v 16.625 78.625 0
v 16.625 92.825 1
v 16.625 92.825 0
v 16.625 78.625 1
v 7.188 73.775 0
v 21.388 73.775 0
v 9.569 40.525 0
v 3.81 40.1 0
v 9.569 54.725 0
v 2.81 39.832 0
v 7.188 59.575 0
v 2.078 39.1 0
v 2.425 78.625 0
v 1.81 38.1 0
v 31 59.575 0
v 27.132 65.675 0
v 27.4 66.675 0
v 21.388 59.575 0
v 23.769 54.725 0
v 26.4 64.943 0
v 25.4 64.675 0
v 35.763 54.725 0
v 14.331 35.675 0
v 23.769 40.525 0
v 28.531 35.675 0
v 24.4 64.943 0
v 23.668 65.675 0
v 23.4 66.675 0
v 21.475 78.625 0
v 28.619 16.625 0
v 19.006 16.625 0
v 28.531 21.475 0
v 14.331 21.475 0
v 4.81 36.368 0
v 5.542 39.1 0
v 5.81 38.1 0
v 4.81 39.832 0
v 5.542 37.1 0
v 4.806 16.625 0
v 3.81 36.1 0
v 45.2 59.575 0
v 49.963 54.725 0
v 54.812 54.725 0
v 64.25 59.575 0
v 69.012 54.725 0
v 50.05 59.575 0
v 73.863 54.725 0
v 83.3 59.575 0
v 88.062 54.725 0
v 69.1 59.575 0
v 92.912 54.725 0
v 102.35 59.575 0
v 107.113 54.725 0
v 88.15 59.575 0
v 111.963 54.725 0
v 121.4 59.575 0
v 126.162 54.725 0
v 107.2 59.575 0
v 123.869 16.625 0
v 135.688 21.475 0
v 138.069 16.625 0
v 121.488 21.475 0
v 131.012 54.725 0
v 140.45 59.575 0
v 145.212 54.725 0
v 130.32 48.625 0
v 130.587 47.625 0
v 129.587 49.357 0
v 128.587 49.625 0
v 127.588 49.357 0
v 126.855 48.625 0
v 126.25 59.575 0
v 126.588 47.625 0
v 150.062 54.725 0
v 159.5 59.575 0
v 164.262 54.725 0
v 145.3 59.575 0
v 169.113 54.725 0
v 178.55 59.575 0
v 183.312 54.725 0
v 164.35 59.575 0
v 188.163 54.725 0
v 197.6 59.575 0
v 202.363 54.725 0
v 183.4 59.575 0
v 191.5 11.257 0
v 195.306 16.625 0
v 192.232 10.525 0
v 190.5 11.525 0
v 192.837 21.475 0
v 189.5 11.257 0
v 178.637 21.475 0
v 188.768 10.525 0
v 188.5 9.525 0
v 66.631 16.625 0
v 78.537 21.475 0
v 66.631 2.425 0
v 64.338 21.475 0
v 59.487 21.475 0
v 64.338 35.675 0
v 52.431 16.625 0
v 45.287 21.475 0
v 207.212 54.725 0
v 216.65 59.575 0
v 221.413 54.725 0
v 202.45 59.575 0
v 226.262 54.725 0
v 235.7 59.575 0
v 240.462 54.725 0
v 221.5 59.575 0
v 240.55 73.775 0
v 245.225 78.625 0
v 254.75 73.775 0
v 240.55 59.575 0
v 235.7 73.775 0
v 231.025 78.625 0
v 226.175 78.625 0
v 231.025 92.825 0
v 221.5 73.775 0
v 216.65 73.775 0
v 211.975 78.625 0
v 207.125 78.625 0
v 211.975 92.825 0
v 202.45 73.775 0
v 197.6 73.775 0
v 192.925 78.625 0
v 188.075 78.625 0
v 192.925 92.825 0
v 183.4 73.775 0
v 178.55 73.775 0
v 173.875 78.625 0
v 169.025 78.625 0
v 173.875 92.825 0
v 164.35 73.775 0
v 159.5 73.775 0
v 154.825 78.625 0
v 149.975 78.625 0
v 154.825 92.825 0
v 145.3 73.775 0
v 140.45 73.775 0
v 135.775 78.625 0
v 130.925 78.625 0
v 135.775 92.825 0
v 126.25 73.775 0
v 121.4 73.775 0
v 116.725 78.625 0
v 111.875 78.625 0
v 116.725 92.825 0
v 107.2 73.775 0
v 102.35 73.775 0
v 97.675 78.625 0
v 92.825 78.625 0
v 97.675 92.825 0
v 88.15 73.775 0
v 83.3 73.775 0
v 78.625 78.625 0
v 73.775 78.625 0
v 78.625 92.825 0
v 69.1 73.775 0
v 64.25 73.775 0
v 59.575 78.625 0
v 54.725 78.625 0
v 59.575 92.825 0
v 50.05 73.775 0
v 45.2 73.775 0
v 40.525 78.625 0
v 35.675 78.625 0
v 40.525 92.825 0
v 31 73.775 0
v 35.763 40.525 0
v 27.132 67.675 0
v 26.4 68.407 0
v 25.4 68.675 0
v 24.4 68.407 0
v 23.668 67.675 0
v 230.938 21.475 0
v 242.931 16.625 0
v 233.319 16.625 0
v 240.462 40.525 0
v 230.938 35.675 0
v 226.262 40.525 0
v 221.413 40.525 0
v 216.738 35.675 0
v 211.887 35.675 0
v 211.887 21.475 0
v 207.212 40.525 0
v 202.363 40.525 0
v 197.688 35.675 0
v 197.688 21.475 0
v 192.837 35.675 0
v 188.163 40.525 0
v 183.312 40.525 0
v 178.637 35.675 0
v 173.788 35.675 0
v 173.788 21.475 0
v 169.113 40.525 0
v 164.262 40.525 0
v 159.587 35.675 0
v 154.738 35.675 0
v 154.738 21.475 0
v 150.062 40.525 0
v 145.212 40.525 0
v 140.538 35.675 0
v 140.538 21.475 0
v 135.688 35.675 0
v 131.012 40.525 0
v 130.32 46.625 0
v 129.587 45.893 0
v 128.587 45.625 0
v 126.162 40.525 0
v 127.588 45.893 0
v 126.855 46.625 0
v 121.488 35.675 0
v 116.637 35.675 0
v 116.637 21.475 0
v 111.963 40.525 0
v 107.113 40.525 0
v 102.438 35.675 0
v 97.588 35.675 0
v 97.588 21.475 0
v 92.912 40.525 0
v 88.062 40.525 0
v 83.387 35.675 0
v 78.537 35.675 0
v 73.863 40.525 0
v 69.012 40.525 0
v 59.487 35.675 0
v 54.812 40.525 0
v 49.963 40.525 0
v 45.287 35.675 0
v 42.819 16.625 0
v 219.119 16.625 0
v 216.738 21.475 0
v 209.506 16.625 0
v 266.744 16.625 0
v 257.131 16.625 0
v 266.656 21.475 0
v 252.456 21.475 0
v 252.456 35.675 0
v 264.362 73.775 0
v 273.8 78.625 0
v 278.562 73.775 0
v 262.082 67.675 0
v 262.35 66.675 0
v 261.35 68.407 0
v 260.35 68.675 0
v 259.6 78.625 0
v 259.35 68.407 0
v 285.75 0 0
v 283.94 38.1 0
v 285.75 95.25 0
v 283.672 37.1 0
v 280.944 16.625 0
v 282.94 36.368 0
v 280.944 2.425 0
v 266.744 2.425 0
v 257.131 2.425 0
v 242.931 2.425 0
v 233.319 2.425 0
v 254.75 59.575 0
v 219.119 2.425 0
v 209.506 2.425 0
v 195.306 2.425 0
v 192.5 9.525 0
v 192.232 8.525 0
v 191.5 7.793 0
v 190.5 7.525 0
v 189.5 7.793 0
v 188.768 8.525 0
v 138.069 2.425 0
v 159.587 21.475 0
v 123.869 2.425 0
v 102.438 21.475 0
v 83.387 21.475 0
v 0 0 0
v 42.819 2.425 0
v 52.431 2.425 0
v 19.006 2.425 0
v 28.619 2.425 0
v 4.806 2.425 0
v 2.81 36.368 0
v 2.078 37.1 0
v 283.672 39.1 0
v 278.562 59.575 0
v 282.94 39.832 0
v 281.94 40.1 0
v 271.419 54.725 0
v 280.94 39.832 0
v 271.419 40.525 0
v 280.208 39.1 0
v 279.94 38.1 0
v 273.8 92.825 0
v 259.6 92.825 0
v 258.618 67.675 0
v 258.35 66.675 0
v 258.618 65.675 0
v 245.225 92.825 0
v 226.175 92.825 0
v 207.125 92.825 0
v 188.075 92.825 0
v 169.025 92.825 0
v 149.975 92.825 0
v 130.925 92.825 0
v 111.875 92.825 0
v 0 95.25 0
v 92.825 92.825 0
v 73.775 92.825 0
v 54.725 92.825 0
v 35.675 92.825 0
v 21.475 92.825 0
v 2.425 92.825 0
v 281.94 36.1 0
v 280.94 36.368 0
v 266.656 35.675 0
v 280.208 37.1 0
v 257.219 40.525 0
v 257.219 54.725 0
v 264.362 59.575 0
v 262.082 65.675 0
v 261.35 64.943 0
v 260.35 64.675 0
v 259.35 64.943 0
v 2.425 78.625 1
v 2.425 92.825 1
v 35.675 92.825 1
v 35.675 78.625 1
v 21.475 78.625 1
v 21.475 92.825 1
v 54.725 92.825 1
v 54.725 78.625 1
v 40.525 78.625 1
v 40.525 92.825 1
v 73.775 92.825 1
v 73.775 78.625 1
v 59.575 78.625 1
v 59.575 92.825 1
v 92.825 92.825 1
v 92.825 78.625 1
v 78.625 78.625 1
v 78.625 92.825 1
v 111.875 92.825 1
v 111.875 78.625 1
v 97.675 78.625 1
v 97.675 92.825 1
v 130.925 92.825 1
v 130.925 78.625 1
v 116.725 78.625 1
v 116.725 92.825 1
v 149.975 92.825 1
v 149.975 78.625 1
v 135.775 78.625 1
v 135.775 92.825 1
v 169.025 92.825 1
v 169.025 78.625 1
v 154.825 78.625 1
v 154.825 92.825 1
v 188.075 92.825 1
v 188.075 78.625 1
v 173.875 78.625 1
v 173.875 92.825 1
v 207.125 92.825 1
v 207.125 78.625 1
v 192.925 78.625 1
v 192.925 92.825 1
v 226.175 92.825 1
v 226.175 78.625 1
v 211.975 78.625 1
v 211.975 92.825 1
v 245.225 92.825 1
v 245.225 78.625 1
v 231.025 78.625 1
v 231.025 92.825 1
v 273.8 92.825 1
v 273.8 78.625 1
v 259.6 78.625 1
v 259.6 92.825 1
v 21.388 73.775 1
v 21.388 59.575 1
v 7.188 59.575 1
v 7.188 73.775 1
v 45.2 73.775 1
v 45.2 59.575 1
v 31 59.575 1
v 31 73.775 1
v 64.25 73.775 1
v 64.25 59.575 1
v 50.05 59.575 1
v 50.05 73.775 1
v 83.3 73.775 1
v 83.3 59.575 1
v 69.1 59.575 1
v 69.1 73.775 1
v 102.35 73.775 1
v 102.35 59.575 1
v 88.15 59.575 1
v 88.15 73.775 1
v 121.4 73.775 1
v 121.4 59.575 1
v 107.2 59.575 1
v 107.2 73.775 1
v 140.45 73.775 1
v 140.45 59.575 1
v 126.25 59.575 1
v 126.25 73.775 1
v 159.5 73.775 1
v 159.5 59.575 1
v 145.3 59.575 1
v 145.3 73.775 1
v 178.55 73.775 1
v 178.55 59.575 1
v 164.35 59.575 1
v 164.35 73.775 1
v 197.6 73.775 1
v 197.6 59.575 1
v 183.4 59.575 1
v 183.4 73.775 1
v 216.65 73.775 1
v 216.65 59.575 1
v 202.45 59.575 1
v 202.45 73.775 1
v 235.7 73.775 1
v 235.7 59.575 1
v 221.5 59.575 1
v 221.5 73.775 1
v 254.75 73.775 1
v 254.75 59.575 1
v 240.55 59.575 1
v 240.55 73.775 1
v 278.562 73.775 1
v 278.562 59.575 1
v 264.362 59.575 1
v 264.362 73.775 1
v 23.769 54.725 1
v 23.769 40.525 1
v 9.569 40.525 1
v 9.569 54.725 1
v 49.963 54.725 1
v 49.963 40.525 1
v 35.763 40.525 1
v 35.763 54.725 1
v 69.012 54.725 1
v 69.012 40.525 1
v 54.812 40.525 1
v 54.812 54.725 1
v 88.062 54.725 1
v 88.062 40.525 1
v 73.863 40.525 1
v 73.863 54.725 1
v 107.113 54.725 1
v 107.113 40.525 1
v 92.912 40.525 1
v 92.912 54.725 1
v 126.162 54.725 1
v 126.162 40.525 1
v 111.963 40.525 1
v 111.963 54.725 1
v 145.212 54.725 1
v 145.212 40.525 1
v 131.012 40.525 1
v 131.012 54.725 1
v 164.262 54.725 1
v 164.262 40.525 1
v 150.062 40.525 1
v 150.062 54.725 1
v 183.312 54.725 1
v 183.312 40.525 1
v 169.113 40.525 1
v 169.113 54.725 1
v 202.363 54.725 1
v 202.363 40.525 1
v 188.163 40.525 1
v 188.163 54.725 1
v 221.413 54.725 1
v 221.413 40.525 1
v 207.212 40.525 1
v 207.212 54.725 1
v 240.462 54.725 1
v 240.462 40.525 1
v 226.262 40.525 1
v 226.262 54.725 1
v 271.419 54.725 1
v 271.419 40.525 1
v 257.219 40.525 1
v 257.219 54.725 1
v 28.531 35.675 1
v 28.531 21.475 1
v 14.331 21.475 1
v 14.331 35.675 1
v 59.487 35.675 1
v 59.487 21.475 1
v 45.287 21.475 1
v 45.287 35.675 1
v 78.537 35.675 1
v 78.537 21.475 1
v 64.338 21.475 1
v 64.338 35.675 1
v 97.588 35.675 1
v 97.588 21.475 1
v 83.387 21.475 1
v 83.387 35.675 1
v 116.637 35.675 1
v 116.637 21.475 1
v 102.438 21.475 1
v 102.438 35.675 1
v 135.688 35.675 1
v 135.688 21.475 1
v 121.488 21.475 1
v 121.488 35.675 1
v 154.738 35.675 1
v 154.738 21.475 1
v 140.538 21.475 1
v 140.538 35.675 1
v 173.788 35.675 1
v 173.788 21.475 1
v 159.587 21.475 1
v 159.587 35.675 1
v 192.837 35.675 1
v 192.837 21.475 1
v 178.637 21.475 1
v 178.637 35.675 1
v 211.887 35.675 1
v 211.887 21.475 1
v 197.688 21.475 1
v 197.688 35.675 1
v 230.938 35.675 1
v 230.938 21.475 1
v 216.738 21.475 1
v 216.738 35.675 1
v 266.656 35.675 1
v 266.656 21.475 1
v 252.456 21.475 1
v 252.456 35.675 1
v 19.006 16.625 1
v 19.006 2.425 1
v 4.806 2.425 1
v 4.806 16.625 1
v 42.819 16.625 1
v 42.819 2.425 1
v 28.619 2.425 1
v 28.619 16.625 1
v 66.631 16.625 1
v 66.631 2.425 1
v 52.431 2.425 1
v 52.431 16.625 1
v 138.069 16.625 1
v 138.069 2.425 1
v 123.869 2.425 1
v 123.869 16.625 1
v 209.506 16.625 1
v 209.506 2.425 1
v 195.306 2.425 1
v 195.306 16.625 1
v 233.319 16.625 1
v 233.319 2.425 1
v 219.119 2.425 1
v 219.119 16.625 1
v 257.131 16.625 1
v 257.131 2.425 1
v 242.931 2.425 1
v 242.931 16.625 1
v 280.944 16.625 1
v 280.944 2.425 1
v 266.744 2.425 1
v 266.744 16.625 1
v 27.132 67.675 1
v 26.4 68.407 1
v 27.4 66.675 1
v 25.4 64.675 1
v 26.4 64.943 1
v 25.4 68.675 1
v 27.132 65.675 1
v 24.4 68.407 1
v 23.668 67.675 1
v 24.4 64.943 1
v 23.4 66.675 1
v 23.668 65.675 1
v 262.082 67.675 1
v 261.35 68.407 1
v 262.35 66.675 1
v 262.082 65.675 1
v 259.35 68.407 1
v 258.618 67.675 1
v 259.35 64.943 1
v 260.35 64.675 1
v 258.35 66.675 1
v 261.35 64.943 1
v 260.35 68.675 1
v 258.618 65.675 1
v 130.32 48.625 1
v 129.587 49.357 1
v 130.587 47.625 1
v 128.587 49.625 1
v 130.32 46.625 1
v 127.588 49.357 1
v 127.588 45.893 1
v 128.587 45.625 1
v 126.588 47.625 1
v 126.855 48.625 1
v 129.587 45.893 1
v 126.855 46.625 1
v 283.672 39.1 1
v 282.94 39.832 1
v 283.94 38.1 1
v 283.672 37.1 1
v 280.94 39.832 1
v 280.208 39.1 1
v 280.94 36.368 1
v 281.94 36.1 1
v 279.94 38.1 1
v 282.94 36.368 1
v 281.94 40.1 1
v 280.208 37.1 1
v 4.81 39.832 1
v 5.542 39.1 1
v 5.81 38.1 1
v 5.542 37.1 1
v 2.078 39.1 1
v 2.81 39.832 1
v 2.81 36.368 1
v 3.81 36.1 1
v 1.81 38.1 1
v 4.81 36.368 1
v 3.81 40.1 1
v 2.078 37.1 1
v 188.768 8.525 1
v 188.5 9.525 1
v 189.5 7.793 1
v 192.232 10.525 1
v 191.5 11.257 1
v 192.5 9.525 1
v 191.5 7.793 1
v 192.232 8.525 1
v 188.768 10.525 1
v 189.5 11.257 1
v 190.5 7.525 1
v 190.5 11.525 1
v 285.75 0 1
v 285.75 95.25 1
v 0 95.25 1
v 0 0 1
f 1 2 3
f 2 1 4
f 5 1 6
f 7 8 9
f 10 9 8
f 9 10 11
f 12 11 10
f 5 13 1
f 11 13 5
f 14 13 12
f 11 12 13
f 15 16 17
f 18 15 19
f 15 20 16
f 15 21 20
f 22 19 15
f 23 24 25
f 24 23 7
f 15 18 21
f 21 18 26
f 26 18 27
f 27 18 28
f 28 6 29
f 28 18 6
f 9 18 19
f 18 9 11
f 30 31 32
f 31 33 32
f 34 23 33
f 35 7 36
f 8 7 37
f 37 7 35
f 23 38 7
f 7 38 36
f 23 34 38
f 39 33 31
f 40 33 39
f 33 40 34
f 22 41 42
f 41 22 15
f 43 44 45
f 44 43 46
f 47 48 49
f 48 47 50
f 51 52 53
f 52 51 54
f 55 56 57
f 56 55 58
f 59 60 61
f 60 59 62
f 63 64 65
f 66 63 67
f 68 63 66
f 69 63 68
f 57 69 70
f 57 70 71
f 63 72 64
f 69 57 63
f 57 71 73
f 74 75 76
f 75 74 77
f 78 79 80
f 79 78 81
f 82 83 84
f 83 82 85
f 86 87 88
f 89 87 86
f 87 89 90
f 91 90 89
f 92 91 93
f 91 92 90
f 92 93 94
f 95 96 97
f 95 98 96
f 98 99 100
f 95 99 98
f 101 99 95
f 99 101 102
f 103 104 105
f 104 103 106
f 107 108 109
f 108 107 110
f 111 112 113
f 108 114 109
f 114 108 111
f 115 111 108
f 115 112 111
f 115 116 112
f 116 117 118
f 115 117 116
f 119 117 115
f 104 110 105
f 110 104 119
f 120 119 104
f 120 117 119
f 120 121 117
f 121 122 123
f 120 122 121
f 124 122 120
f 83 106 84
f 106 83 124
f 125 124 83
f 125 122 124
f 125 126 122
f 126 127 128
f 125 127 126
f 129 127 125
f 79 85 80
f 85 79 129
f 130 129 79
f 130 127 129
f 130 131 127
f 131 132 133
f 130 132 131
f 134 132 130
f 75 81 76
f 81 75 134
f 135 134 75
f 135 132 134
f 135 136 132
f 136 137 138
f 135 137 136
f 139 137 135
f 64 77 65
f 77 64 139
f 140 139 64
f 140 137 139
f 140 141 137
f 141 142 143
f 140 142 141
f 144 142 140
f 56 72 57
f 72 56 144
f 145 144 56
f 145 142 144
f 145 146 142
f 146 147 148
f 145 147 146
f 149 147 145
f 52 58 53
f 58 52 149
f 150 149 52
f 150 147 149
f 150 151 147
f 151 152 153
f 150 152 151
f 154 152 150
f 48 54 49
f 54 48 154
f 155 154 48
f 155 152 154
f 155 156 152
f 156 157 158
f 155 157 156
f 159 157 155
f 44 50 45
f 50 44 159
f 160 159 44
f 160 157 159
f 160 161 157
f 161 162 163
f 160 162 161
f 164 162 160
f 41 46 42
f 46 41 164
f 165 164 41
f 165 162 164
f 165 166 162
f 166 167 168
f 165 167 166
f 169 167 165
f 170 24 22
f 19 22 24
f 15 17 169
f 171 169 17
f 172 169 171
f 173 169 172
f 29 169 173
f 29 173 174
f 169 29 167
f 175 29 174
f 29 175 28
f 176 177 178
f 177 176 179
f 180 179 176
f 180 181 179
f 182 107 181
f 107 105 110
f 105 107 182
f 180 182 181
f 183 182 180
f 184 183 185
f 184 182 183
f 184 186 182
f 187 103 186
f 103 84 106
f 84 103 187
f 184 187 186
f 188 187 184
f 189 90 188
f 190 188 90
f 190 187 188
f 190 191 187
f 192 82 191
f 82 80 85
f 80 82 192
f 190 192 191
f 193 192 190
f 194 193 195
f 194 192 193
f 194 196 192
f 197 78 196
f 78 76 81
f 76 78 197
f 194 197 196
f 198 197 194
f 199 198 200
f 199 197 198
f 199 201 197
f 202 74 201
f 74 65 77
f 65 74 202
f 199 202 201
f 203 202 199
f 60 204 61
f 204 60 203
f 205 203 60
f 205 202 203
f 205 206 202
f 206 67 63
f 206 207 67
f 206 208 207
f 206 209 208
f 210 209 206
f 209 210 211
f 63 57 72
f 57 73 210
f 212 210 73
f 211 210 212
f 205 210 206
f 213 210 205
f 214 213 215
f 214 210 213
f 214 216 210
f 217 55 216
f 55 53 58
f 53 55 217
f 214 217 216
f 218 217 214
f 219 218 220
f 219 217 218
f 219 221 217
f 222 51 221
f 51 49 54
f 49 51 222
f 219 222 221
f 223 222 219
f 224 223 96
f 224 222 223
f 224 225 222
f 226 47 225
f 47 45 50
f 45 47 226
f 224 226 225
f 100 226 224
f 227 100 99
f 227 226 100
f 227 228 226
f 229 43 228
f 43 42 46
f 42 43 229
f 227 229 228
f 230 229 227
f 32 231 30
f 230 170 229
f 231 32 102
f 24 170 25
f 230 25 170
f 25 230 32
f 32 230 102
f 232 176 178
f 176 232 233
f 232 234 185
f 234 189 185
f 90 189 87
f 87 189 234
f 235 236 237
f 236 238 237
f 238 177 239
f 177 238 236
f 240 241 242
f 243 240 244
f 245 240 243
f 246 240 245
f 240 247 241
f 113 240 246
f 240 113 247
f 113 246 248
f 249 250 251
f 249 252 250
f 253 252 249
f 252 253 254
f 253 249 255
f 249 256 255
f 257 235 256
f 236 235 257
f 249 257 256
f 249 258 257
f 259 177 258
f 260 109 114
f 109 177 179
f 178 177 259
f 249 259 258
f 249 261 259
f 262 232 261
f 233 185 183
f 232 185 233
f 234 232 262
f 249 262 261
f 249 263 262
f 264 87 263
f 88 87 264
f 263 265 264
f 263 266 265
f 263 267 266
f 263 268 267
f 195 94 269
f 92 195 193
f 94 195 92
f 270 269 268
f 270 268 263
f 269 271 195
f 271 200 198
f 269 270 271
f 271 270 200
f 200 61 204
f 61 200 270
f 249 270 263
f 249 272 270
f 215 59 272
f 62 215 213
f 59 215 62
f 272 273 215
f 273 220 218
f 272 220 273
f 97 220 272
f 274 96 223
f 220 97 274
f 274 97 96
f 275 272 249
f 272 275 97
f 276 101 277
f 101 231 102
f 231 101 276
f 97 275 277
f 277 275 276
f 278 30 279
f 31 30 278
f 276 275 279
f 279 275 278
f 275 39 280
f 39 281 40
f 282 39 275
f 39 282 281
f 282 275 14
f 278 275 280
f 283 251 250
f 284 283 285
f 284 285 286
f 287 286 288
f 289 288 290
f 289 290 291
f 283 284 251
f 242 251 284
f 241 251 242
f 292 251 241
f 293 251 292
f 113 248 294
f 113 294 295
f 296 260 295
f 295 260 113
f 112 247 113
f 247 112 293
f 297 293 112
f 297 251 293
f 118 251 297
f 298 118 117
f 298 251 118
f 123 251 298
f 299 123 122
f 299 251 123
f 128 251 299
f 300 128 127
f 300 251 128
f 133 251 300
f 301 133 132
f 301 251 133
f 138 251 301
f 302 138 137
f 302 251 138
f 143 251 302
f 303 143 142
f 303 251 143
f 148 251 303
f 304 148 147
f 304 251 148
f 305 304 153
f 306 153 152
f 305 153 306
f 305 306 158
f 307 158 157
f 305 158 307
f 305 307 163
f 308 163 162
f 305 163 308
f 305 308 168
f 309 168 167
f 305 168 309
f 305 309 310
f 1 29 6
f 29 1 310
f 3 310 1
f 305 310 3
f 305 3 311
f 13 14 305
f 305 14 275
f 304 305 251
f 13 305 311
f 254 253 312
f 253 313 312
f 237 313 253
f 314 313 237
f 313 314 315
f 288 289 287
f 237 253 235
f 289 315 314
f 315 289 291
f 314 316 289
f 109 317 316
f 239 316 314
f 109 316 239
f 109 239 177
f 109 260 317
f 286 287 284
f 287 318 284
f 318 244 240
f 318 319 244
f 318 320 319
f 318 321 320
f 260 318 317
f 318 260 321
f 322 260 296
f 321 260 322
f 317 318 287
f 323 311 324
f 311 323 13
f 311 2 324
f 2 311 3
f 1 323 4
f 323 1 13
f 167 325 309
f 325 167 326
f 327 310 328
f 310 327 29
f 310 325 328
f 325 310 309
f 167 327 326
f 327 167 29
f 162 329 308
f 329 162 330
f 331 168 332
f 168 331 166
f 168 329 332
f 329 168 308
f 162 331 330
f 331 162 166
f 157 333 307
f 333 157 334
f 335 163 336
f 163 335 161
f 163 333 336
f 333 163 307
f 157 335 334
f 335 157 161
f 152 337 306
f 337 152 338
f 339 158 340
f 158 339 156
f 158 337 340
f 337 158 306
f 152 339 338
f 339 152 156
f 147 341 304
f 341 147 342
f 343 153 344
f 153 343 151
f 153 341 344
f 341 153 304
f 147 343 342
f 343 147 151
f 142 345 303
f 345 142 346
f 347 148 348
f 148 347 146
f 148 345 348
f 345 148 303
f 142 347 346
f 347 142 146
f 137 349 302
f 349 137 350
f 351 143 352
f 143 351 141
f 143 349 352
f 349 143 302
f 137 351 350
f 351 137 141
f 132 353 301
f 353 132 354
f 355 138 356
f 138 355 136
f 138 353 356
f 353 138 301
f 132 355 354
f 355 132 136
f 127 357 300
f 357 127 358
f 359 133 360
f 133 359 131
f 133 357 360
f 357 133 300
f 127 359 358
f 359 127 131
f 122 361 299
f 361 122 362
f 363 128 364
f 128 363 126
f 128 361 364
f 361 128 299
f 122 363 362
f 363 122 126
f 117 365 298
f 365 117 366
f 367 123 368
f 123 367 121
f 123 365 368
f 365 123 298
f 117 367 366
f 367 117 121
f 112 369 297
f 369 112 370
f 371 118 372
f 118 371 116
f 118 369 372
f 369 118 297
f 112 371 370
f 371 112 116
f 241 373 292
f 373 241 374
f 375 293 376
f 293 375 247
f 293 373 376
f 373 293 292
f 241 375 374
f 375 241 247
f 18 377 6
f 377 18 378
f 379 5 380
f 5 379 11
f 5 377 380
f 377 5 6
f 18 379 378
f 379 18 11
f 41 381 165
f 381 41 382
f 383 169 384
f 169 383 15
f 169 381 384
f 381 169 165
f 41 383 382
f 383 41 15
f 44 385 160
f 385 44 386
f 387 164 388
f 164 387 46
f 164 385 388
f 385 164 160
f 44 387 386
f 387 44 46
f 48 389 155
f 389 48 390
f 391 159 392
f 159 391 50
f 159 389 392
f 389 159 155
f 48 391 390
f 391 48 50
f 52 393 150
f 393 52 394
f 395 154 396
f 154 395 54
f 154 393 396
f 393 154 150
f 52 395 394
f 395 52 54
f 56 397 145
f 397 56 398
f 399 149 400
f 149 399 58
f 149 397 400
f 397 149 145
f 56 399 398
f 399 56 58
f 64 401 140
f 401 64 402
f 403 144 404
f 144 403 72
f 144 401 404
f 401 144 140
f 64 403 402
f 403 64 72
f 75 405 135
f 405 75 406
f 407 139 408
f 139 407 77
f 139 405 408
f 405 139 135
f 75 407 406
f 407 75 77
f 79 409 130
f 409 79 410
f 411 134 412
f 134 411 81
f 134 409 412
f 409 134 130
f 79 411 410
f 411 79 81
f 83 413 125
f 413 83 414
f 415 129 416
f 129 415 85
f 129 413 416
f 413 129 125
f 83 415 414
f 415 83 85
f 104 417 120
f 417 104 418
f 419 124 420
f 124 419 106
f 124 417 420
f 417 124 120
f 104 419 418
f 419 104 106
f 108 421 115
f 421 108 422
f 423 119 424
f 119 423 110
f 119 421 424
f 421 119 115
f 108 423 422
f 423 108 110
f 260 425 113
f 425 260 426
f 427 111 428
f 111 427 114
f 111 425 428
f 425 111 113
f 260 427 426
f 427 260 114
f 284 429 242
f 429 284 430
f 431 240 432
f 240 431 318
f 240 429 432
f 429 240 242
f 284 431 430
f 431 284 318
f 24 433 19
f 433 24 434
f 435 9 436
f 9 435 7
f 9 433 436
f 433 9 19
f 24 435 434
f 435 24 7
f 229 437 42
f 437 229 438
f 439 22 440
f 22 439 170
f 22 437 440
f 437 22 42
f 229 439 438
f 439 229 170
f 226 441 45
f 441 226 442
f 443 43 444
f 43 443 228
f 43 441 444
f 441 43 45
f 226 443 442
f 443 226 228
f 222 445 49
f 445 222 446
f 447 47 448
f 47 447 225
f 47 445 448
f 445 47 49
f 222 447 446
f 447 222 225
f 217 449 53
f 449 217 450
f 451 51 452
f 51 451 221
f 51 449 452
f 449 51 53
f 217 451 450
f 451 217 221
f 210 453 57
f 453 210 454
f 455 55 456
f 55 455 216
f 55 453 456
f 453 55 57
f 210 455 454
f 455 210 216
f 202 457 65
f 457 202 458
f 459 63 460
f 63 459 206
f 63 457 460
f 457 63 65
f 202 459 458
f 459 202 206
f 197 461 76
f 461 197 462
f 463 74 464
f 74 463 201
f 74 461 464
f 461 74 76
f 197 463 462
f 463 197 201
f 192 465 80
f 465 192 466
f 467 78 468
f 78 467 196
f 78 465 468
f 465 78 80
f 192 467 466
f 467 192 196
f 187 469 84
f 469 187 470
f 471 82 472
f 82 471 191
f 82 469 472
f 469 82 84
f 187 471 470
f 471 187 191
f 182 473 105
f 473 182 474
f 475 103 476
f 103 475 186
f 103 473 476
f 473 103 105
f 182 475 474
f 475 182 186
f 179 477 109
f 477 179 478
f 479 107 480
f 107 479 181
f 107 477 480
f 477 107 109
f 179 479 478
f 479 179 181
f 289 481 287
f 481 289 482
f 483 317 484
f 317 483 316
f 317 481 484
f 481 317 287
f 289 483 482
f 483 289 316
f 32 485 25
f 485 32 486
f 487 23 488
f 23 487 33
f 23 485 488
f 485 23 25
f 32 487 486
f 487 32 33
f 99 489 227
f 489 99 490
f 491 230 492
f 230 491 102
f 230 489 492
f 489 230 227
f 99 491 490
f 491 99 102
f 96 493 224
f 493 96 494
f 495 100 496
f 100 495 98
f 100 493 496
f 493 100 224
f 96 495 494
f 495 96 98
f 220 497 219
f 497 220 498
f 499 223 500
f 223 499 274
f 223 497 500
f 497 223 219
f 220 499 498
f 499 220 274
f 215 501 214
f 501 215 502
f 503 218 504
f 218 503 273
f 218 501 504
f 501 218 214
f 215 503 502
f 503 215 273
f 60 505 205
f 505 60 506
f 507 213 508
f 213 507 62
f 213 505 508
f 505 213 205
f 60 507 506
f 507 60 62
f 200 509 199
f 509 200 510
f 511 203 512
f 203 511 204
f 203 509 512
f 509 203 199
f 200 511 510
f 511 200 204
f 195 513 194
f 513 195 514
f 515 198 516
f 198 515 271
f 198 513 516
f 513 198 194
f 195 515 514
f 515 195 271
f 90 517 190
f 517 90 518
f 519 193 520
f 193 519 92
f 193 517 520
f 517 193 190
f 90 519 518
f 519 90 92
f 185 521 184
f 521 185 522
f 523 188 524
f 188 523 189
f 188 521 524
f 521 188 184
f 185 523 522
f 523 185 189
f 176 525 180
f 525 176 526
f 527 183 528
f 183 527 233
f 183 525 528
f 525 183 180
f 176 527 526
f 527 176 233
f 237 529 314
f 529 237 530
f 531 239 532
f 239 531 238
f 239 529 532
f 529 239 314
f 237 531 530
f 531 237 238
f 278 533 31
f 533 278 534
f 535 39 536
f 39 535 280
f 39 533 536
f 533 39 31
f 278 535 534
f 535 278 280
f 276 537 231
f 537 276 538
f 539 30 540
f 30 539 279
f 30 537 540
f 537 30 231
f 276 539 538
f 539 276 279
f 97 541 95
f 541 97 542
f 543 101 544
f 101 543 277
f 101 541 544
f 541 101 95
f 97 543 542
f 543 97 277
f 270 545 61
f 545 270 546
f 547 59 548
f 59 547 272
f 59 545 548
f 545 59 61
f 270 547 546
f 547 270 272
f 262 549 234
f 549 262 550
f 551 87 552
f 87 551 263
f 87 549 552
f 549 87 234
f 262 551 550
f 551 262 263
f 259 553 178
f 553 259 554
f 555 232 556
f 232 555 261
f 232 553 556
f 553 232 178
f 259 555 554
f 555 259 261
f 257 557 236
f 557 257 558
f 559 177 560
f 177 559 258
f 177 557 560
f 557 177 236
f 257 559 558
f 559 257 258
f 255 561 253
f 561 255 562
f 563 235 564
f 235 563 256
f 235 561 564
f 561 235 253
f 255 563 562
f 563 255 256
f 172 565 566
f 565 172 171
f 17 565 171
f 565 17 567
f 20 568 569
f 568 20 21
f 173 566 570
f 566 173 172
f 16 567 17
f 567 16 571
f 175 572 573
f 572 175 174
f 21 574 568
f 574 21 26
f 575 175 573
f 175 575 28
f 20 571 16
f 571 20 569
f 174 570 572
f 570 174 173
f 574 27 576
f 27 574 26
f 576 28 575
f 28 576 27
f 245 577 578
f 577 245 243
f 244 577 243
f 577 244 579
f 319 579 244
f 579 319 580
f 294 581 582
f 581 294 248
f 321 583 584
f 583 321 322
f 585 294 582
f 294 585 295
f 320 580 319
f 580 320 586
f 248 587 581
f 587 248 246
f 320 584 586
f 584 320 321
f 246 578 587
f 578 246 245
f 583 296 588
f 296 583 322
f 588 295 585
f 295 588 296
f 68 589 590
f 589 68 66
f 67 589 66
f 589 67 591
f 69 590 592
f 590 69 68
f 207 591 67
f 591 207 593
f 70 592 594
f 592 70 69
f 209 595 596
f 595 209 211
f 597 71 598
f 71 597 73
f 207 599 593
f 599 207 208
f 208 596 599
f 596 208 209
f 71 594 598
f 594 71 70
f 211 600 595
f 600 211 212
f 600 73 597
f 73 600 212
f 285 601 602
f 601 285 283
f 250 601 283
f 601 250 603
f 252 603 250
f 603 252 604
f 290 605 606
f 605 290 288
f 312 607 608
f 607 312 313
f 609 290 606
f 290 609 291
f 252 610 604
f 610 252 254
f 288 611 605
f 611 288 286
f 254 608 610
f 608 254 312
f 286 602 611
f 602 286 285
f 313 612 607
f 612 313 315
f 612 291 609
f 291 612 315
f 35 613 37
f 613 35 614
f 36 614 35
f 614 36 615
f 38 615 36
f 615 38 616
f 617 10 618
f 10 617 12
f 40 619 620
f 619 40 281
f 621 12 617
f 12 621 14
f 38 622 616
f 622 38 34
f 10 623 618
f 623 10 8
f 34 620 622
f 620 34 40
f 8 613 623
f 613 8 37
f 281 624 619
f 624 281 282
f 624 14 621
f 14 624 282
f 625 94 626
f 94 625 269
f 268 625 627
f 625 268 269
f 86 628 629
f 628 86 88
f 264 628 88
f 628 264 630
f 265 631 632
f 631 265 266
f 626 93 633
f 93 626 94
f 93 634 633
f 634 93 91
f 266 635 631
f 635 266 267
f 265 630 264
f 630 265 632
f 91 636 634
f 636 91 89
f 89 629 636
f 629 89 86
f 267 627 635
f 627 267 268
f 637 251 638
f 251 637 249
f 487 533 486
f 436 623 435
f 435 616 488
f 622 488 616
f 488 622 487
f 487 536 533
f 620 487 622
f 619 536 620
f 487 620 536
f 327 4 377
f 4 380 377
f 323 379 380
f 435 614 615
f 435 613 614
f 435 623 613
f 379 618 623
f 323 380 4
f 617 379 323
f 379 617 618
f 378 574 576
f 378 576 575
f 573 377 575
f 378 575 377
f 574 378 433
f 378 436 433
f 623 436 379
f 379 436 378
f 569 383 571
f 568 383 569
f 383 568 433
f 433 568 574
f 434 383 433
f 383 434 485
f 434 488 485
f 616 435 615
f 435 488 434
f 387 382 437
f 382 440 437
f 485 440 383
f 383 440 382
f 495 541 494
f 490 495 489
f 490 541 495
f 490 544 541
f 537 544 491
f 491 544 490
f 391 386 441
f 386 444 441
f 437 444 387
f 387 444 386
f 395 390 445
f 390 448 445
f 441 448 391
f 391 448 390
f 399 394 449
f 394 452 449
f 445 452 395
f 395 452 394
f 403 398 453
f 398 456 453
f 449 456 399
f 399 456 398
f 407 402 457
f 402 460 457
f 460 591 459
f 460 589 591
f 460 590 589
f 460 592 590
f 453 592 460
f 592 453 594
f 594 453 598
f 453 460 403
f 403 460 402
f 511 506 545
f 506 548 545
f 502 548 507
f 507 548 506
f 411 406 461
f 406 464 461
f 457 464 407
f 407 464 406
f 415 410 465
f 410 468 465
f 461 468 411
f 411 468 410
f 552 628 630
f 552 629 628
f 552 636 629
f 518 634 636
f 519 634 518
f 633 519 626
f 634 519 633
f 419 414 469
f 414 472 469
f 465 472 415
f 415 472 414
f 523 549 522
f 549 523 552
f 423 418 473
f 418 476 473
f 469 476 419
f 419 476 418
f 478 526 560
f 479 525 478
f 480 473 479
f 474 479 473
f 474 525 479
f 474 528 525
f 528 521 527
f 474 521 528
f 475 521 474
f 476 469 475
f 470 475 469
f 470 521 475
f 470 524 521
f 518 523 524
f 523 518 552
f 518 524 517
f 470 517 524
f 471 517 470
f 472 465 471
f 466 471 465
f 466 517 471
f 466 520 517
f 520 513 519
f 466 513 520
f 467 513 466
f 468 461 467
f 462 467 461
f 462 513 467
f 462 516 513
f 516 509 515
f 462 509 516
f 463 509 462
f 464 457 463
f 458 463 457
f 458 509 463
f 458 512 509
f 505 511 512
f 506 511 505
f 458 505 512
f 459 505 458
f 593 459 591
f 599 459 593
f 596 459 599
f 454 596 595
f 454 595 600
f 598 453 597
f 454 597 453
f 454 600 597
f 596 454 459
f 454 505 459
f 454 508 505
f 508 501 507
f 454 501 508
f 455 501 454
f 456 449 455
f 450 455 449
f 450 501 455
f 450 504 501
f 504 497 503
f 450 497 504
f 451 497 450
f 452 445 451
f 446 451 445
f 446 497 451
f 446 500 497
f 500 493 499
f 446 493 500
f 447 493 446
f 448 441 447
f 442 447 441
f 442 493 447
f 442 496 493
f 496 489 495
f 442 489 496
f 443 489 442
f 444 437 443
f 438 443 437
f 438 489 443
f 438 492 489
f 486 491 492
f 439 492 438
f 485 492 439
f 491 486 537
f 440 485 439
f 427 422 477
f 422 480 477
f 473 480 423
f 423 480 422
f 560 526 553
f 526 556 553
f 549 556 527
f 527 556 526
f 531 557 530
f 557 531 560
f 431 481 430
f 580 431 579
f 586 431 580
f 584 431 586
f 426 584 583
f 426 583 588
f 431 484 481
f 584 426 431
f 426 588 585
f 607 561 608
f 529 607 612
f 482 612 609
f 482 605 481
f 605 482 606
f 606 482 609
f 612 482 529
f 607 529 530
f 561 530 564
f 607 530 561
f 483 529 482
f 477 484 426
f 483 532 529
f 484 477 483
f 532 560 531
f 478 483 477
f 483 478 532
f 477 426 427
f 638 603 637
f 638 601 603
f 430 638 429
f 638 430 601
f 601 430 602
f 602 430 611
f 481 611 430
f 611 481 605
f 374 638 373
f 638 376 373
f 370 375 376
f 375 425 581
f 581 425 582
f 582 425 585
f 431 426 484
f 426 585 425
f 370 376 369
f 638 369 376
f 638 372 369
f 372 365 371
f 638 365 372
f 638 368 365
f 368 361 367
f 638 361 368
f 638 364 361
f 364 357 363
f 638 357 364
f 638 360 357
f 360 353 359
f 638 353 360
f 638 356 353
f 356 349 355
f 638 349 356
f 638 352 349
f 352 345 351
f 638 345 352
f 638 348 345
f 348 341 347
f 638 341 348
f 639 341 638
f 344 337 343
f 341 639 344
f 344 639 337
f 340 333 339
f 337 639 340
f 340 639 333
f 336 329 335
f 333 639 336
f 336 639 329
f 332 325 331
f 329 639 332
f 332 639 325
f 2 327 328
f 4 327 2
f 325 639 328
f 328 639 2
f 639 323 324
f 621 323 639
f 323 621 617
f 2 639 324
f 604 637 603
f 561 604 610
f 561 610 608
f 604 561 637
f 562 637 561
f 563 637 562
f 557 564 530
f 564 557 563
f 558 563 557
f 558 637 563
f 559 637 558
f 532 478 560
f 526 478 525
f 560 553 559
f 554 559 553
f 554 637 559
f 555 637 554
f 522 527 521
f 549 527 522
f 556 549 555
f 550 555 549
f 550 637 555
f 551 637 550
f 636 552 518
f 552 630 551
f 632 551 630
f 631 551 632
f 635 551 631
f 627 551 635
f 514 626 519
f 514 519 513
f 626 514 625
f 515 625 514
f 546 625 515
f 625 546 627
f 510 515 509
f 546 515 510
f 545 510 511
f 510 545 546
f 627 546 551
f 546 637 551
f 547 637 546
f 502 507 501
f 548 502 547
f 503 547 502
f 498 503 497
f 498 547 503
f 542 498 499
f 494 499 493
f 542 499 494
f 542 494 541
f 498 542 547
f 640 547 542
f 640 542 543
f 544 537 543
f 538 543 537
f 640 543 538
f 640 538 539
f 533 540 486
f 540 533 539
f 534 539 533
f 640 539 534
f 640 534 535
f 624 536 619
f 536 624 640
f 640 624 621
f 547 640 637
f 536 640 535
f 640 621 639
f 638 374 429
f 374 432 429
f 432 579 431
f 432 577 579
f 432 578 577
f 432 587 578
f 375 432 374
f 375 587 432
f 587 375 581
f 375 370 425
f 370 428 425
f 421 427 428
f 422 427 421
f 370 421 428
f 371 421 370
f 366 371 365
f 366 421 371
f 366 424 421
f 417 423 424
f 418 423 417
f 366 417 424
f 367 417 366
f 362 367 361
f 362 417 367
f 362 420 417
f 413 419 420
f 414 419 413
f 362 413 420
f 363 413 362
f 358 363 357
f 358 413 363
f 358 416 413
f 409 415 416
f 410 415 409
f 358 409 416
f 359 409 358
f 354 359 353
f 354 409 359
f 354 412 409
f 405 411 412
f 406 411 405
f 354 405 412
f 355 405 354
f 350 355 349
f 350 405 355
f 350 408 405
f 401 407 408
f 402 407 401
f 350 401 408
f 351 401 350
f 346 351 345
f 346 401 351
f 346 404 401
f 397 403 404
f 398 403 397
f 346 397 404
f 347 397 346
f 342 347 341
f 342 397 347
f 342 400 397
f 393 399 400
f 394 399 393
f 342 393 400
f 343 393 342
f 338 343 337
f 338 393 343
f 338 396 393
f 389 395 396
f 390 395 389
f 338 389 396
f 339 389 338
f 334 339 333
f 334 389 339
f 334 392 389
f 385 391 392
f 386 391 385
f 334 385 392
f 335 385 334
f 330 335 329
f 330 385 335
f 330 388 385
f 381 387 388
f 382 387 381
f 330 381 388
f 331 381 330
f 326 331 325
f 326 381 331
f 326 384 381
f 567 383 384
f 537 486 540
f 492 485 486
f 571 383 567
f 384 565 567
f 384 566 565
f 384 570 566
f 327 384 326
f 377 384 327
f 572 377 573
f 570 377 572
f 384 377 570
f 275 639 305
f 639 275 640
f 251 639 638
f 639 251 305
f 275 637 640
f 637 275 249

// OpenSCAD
// file: plate.scad
// Thickness of entire plate
plate_thickness=3;
// Unit square length, from Cherry MX data sheet
unit=19.05;
// Hole size. 14 is standard
hole_size=14.2;


// length, in units, of board
width_in_units=15;
// Height, in units, of board
height_in_units=5;

// Radius of mounting holes
mounting_hole_radius=2;

// whether to use the fancy cutout switches
fancy_hole = false;


// height of switch clasp cutouts
cutout_height = 3;
// width of switch clasp cutouts
cutoutwidth = 1;

//calculated vars
width=width_in_units*unit;
height=height_in_units*unit;

sixty_percent_holes = [[1+1/3,3.5], [13+2/3,3.5], [6.75,2.5], [6.75,2.5], [14.8,2], [.2,2], [10,0.5]];

module plate(width, height, thickness){
	cube([width,height,thickness]);
}

module switch_hole(){
	cube([hole_size,hole_size,plate_thickness]);

	if(fancy_hole){
		translate([-cutoutwidth,1,0])
		cube([hole_size+2*cutoutwidth,cutout_height,plate_thickness]);

		translate([-cutoutwidth,hole_size-cutoutwidth-cutout_height,0])
		cube([hole_size+2*cutoutwidth,cutout_height,plate_thickness]);
	}
}

module hole_matrix(holes,startx,starty){
	for (key = holes){
		translate([startx+unit*key[0], starty-unit*key[1], 0]){
			translate([(unit*key[2]-hole_size)/2,(unit - hole_size)/2, 0]){
				switch_hole();
			}
		}
	}
}

module mounting_holes(holes){
	for (hole = holes) {
		translate([hole[0] * unit, hole[1] * unit]) {
			cylinder(h=plate_thickness,r=mounting_hole_radius, $fn=12);
		}
	}
}

module full_plate(width, height, key_holes, mounting_holes=sixty_percent_holes){
	difference(){
		plate(width,height);
		hole_matrix(key_holes,0,height-unit);
		mounting_holes(mounting_holes);
	}
}
// main file
include <plate.scad>

//poker keyboard layout layer
pokerkeyboard = [
//start ROW 0
[0,0,1], [1,0,1], [2,0,1], [3,0,1], [4,0,1], [5,0,1], [6,0,1], [7,0,1], [8,0,1], [9,0,1], [10,0,1], [11,0,1], [12,0,1], [13,0,2],
//start ROW 1
[0,1,1.5], [1.5,1,1], [2.5,1,1], [3.5,1,1], [4.5,1,1], [5.5,1,1], [6.5,1,1], [7.5,1,1], [8.5,1,1], [9.5,1,1], [10.5,1,1], [11.5,1,1], [12.5,1,1], [13.5,1,1.5],
//start ROW 2
[0,2,1.75], [1.75,2,1], [2.75,2,1], [3.75,2,1], [4.75,2,1], [5.75,2,1], [6.75,2,1], [7.75,2,1], [8.75,2,1], [9.75,2,1], [10.75,2,1], [11.75,2,1], [12.75,2,2.25],
//start ROW 3
[0,3,2.25], [2.25,3,1], [3.25,3,1], [4.25,3,1], [5.25,3,1], [6.25,3,1], [7.25,3,1], [8.25,3,1], [9.25,3,1], [10.25,3,1], [11.25,3,1], [12.25,3,2.75],
//start ROW 4
[0,4,1.25], [1.25,4,1.25], [2.5 ,4,1.25], [3.75,4,6.25], [10,4,1.25], [11.25,4,1.25], [12.5,4,1.25], [13.75,4,1.25],
];

full_plate(width, height, pokerkeyboard);
